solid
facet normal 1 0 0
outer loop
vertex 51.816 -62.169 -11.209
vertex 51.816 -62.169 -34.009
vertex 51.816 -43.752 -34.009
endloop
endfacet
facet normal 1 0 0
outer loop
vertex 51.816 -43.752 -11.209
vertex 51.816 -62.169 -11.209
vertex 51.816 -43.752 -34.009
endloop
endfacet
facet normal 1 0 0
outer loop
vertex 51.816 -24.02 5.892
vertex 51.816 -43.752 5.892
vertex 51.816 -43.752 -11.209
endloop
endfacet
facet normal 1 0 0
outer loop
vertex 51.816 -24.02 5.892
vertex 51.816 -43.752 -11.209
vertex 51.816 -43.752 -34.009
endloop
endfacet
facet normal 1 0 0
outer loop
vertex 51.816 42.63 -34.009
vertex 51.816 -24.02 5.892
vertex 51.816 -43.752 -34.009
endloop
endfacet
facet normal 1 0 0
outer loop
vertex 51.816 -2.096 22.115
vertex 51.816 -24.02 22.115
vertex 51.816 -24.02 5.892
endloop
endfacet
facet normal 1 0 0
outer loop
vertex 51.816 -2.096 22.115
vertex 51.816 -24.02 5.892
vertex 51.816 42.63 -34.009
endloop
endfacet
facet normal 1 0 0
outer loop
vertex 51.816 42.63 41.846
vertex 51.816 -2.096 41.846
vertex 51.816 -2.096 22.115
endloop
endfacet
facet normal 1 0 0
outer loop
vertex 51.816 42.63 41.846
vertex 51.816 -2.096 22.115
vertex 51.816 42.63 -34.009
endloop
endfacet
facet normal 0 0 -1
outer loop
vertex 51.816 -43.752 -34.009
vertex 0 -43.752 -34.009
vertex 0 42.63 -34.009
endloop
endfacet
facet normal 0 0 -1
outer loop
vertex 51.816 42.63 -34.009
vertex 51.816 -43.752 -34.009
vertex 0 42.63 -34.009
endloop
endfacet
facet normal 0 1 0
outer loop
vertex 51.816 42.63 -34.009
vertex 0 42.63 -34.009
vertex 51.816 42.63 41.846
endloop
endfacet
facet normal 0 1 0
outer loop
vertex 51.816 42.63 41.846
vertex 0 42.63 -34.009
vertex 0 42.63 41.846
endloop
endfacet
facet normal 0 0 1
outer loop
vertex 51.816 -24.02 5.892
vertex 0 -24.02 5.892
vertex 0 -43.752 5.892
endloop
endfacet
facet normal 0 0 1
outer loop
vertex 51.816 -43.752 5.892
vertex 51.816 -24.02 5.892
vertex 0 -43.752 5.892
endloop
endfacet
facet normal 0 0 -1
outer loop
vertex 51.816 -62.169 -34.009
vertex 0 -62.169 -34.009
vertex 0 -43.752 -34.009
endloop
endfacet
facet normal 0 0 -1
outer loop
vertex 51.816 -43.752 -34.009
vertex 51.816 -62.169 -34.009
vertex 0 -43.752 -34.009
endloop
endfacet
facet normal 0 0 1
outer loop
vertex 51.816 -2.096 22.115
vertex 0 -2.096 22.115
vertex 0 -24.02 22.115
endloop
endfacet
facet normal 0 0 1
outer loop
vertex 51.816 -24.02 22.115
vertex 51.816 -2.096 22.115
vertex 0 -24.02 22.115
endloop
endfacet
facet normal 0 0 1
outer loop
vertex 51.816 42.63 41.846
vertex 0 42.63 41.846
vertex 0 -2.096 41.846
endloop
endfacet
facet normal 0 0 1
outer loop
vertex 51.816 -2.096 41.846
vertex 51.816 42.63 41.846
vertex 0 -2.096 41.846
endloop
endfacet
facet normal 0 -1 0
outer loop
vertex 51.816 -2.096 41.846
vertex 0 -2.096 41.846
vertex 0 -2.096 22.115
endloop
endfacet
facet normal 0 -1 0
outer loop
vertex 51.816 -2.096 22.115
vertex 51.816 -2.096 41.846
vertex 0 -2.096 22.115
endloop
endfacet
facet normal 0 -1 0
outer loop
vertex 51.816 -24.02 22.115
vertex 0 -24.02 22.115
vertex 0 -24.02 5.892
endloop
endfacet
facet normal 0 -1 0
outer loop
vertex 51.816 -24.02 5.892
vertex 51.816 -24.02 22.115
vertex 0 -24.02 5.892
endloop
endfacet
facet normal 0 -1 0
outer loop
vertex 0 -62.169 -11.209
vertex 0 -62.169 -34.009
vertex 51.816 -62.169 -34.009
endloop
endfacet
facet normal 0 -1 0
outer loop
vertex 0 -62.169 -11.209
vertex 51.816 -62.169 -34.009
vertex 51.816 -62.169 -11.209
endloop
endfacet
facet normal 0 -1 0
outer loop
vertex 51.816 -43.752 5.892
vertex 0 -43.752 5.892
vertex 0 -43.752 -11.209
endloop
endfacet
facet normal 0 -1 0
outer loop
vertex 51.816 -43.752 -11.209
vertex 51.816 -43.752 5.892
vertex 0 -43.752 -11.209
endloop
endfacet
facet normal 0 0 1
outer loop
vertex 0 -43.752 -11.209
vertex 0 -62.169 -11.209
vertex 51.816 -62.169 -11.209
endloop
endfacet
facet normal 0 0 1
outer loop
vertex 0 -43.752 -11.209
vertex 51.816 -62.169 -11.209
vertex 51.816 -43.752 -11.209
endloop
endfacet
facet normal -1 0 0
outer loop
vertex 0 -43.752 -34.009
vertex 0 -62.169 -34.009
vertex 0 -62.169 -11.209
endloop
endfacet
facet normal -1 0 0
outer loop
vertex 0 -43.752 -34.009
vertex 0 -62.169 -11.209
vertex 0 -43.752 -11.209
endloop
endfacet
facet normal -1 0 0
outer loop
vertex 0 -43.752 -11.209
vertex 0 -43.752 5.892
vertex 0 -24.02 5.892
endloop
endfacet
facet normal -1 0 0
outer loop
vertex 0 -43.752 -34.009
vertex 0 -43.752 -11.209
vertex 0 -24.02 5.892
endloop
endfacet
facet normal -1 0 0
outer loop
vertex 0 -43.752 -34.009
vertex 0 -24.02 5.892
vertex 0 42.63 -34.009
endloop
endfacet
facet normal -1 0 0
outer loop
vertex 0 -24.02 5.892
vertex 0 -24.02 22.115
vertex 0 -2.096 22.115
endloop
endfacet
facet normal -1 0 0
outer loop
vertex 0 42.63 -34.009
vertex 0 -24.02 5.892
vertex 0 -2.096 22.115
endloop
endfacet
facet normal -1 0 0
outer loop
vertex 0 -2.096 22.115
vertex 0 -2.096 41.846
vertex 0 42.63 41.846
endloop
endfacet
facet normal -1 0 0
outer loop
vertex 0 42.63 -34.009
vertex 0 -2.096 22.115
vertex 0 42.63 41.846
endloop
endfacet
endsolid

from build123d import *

# Parameters (mm, degrees)
F0_W     = 18.416568
F0_H     = 22.800551
F1_DEPTH = 51.816


with BuildPart() as f1:
    # F0 (on Right) → F1 (new body)
    with BuildSketch(Plane.YZ):
        Polygon((42.630378, -34.009408), (42.630378, 41.846275), (-2.095759, 41.846275), (-2.095759, 22.115029), (-2.095759, -34.009408), align=None)
        Polygon((-2.095759, -34.009408), (-2.095759, 22.115029), (-24.020061, 22.115029), (-24.020061, 5.891558), (-24.020061, -34.009408), align=None)
        Polygon((-43.752097, -34.009408), (-24.020061, -34.009408), (-24.020061, 5.891558), (-43.752097, 5.891558), (-43.752097, -11.208857), align=None)
        with Locations((-52.960381, -22.609133)):
            Rectangle(F0_W, F0_H)
    extrude(amount=F1_DEPTH)


solid = f1.part
